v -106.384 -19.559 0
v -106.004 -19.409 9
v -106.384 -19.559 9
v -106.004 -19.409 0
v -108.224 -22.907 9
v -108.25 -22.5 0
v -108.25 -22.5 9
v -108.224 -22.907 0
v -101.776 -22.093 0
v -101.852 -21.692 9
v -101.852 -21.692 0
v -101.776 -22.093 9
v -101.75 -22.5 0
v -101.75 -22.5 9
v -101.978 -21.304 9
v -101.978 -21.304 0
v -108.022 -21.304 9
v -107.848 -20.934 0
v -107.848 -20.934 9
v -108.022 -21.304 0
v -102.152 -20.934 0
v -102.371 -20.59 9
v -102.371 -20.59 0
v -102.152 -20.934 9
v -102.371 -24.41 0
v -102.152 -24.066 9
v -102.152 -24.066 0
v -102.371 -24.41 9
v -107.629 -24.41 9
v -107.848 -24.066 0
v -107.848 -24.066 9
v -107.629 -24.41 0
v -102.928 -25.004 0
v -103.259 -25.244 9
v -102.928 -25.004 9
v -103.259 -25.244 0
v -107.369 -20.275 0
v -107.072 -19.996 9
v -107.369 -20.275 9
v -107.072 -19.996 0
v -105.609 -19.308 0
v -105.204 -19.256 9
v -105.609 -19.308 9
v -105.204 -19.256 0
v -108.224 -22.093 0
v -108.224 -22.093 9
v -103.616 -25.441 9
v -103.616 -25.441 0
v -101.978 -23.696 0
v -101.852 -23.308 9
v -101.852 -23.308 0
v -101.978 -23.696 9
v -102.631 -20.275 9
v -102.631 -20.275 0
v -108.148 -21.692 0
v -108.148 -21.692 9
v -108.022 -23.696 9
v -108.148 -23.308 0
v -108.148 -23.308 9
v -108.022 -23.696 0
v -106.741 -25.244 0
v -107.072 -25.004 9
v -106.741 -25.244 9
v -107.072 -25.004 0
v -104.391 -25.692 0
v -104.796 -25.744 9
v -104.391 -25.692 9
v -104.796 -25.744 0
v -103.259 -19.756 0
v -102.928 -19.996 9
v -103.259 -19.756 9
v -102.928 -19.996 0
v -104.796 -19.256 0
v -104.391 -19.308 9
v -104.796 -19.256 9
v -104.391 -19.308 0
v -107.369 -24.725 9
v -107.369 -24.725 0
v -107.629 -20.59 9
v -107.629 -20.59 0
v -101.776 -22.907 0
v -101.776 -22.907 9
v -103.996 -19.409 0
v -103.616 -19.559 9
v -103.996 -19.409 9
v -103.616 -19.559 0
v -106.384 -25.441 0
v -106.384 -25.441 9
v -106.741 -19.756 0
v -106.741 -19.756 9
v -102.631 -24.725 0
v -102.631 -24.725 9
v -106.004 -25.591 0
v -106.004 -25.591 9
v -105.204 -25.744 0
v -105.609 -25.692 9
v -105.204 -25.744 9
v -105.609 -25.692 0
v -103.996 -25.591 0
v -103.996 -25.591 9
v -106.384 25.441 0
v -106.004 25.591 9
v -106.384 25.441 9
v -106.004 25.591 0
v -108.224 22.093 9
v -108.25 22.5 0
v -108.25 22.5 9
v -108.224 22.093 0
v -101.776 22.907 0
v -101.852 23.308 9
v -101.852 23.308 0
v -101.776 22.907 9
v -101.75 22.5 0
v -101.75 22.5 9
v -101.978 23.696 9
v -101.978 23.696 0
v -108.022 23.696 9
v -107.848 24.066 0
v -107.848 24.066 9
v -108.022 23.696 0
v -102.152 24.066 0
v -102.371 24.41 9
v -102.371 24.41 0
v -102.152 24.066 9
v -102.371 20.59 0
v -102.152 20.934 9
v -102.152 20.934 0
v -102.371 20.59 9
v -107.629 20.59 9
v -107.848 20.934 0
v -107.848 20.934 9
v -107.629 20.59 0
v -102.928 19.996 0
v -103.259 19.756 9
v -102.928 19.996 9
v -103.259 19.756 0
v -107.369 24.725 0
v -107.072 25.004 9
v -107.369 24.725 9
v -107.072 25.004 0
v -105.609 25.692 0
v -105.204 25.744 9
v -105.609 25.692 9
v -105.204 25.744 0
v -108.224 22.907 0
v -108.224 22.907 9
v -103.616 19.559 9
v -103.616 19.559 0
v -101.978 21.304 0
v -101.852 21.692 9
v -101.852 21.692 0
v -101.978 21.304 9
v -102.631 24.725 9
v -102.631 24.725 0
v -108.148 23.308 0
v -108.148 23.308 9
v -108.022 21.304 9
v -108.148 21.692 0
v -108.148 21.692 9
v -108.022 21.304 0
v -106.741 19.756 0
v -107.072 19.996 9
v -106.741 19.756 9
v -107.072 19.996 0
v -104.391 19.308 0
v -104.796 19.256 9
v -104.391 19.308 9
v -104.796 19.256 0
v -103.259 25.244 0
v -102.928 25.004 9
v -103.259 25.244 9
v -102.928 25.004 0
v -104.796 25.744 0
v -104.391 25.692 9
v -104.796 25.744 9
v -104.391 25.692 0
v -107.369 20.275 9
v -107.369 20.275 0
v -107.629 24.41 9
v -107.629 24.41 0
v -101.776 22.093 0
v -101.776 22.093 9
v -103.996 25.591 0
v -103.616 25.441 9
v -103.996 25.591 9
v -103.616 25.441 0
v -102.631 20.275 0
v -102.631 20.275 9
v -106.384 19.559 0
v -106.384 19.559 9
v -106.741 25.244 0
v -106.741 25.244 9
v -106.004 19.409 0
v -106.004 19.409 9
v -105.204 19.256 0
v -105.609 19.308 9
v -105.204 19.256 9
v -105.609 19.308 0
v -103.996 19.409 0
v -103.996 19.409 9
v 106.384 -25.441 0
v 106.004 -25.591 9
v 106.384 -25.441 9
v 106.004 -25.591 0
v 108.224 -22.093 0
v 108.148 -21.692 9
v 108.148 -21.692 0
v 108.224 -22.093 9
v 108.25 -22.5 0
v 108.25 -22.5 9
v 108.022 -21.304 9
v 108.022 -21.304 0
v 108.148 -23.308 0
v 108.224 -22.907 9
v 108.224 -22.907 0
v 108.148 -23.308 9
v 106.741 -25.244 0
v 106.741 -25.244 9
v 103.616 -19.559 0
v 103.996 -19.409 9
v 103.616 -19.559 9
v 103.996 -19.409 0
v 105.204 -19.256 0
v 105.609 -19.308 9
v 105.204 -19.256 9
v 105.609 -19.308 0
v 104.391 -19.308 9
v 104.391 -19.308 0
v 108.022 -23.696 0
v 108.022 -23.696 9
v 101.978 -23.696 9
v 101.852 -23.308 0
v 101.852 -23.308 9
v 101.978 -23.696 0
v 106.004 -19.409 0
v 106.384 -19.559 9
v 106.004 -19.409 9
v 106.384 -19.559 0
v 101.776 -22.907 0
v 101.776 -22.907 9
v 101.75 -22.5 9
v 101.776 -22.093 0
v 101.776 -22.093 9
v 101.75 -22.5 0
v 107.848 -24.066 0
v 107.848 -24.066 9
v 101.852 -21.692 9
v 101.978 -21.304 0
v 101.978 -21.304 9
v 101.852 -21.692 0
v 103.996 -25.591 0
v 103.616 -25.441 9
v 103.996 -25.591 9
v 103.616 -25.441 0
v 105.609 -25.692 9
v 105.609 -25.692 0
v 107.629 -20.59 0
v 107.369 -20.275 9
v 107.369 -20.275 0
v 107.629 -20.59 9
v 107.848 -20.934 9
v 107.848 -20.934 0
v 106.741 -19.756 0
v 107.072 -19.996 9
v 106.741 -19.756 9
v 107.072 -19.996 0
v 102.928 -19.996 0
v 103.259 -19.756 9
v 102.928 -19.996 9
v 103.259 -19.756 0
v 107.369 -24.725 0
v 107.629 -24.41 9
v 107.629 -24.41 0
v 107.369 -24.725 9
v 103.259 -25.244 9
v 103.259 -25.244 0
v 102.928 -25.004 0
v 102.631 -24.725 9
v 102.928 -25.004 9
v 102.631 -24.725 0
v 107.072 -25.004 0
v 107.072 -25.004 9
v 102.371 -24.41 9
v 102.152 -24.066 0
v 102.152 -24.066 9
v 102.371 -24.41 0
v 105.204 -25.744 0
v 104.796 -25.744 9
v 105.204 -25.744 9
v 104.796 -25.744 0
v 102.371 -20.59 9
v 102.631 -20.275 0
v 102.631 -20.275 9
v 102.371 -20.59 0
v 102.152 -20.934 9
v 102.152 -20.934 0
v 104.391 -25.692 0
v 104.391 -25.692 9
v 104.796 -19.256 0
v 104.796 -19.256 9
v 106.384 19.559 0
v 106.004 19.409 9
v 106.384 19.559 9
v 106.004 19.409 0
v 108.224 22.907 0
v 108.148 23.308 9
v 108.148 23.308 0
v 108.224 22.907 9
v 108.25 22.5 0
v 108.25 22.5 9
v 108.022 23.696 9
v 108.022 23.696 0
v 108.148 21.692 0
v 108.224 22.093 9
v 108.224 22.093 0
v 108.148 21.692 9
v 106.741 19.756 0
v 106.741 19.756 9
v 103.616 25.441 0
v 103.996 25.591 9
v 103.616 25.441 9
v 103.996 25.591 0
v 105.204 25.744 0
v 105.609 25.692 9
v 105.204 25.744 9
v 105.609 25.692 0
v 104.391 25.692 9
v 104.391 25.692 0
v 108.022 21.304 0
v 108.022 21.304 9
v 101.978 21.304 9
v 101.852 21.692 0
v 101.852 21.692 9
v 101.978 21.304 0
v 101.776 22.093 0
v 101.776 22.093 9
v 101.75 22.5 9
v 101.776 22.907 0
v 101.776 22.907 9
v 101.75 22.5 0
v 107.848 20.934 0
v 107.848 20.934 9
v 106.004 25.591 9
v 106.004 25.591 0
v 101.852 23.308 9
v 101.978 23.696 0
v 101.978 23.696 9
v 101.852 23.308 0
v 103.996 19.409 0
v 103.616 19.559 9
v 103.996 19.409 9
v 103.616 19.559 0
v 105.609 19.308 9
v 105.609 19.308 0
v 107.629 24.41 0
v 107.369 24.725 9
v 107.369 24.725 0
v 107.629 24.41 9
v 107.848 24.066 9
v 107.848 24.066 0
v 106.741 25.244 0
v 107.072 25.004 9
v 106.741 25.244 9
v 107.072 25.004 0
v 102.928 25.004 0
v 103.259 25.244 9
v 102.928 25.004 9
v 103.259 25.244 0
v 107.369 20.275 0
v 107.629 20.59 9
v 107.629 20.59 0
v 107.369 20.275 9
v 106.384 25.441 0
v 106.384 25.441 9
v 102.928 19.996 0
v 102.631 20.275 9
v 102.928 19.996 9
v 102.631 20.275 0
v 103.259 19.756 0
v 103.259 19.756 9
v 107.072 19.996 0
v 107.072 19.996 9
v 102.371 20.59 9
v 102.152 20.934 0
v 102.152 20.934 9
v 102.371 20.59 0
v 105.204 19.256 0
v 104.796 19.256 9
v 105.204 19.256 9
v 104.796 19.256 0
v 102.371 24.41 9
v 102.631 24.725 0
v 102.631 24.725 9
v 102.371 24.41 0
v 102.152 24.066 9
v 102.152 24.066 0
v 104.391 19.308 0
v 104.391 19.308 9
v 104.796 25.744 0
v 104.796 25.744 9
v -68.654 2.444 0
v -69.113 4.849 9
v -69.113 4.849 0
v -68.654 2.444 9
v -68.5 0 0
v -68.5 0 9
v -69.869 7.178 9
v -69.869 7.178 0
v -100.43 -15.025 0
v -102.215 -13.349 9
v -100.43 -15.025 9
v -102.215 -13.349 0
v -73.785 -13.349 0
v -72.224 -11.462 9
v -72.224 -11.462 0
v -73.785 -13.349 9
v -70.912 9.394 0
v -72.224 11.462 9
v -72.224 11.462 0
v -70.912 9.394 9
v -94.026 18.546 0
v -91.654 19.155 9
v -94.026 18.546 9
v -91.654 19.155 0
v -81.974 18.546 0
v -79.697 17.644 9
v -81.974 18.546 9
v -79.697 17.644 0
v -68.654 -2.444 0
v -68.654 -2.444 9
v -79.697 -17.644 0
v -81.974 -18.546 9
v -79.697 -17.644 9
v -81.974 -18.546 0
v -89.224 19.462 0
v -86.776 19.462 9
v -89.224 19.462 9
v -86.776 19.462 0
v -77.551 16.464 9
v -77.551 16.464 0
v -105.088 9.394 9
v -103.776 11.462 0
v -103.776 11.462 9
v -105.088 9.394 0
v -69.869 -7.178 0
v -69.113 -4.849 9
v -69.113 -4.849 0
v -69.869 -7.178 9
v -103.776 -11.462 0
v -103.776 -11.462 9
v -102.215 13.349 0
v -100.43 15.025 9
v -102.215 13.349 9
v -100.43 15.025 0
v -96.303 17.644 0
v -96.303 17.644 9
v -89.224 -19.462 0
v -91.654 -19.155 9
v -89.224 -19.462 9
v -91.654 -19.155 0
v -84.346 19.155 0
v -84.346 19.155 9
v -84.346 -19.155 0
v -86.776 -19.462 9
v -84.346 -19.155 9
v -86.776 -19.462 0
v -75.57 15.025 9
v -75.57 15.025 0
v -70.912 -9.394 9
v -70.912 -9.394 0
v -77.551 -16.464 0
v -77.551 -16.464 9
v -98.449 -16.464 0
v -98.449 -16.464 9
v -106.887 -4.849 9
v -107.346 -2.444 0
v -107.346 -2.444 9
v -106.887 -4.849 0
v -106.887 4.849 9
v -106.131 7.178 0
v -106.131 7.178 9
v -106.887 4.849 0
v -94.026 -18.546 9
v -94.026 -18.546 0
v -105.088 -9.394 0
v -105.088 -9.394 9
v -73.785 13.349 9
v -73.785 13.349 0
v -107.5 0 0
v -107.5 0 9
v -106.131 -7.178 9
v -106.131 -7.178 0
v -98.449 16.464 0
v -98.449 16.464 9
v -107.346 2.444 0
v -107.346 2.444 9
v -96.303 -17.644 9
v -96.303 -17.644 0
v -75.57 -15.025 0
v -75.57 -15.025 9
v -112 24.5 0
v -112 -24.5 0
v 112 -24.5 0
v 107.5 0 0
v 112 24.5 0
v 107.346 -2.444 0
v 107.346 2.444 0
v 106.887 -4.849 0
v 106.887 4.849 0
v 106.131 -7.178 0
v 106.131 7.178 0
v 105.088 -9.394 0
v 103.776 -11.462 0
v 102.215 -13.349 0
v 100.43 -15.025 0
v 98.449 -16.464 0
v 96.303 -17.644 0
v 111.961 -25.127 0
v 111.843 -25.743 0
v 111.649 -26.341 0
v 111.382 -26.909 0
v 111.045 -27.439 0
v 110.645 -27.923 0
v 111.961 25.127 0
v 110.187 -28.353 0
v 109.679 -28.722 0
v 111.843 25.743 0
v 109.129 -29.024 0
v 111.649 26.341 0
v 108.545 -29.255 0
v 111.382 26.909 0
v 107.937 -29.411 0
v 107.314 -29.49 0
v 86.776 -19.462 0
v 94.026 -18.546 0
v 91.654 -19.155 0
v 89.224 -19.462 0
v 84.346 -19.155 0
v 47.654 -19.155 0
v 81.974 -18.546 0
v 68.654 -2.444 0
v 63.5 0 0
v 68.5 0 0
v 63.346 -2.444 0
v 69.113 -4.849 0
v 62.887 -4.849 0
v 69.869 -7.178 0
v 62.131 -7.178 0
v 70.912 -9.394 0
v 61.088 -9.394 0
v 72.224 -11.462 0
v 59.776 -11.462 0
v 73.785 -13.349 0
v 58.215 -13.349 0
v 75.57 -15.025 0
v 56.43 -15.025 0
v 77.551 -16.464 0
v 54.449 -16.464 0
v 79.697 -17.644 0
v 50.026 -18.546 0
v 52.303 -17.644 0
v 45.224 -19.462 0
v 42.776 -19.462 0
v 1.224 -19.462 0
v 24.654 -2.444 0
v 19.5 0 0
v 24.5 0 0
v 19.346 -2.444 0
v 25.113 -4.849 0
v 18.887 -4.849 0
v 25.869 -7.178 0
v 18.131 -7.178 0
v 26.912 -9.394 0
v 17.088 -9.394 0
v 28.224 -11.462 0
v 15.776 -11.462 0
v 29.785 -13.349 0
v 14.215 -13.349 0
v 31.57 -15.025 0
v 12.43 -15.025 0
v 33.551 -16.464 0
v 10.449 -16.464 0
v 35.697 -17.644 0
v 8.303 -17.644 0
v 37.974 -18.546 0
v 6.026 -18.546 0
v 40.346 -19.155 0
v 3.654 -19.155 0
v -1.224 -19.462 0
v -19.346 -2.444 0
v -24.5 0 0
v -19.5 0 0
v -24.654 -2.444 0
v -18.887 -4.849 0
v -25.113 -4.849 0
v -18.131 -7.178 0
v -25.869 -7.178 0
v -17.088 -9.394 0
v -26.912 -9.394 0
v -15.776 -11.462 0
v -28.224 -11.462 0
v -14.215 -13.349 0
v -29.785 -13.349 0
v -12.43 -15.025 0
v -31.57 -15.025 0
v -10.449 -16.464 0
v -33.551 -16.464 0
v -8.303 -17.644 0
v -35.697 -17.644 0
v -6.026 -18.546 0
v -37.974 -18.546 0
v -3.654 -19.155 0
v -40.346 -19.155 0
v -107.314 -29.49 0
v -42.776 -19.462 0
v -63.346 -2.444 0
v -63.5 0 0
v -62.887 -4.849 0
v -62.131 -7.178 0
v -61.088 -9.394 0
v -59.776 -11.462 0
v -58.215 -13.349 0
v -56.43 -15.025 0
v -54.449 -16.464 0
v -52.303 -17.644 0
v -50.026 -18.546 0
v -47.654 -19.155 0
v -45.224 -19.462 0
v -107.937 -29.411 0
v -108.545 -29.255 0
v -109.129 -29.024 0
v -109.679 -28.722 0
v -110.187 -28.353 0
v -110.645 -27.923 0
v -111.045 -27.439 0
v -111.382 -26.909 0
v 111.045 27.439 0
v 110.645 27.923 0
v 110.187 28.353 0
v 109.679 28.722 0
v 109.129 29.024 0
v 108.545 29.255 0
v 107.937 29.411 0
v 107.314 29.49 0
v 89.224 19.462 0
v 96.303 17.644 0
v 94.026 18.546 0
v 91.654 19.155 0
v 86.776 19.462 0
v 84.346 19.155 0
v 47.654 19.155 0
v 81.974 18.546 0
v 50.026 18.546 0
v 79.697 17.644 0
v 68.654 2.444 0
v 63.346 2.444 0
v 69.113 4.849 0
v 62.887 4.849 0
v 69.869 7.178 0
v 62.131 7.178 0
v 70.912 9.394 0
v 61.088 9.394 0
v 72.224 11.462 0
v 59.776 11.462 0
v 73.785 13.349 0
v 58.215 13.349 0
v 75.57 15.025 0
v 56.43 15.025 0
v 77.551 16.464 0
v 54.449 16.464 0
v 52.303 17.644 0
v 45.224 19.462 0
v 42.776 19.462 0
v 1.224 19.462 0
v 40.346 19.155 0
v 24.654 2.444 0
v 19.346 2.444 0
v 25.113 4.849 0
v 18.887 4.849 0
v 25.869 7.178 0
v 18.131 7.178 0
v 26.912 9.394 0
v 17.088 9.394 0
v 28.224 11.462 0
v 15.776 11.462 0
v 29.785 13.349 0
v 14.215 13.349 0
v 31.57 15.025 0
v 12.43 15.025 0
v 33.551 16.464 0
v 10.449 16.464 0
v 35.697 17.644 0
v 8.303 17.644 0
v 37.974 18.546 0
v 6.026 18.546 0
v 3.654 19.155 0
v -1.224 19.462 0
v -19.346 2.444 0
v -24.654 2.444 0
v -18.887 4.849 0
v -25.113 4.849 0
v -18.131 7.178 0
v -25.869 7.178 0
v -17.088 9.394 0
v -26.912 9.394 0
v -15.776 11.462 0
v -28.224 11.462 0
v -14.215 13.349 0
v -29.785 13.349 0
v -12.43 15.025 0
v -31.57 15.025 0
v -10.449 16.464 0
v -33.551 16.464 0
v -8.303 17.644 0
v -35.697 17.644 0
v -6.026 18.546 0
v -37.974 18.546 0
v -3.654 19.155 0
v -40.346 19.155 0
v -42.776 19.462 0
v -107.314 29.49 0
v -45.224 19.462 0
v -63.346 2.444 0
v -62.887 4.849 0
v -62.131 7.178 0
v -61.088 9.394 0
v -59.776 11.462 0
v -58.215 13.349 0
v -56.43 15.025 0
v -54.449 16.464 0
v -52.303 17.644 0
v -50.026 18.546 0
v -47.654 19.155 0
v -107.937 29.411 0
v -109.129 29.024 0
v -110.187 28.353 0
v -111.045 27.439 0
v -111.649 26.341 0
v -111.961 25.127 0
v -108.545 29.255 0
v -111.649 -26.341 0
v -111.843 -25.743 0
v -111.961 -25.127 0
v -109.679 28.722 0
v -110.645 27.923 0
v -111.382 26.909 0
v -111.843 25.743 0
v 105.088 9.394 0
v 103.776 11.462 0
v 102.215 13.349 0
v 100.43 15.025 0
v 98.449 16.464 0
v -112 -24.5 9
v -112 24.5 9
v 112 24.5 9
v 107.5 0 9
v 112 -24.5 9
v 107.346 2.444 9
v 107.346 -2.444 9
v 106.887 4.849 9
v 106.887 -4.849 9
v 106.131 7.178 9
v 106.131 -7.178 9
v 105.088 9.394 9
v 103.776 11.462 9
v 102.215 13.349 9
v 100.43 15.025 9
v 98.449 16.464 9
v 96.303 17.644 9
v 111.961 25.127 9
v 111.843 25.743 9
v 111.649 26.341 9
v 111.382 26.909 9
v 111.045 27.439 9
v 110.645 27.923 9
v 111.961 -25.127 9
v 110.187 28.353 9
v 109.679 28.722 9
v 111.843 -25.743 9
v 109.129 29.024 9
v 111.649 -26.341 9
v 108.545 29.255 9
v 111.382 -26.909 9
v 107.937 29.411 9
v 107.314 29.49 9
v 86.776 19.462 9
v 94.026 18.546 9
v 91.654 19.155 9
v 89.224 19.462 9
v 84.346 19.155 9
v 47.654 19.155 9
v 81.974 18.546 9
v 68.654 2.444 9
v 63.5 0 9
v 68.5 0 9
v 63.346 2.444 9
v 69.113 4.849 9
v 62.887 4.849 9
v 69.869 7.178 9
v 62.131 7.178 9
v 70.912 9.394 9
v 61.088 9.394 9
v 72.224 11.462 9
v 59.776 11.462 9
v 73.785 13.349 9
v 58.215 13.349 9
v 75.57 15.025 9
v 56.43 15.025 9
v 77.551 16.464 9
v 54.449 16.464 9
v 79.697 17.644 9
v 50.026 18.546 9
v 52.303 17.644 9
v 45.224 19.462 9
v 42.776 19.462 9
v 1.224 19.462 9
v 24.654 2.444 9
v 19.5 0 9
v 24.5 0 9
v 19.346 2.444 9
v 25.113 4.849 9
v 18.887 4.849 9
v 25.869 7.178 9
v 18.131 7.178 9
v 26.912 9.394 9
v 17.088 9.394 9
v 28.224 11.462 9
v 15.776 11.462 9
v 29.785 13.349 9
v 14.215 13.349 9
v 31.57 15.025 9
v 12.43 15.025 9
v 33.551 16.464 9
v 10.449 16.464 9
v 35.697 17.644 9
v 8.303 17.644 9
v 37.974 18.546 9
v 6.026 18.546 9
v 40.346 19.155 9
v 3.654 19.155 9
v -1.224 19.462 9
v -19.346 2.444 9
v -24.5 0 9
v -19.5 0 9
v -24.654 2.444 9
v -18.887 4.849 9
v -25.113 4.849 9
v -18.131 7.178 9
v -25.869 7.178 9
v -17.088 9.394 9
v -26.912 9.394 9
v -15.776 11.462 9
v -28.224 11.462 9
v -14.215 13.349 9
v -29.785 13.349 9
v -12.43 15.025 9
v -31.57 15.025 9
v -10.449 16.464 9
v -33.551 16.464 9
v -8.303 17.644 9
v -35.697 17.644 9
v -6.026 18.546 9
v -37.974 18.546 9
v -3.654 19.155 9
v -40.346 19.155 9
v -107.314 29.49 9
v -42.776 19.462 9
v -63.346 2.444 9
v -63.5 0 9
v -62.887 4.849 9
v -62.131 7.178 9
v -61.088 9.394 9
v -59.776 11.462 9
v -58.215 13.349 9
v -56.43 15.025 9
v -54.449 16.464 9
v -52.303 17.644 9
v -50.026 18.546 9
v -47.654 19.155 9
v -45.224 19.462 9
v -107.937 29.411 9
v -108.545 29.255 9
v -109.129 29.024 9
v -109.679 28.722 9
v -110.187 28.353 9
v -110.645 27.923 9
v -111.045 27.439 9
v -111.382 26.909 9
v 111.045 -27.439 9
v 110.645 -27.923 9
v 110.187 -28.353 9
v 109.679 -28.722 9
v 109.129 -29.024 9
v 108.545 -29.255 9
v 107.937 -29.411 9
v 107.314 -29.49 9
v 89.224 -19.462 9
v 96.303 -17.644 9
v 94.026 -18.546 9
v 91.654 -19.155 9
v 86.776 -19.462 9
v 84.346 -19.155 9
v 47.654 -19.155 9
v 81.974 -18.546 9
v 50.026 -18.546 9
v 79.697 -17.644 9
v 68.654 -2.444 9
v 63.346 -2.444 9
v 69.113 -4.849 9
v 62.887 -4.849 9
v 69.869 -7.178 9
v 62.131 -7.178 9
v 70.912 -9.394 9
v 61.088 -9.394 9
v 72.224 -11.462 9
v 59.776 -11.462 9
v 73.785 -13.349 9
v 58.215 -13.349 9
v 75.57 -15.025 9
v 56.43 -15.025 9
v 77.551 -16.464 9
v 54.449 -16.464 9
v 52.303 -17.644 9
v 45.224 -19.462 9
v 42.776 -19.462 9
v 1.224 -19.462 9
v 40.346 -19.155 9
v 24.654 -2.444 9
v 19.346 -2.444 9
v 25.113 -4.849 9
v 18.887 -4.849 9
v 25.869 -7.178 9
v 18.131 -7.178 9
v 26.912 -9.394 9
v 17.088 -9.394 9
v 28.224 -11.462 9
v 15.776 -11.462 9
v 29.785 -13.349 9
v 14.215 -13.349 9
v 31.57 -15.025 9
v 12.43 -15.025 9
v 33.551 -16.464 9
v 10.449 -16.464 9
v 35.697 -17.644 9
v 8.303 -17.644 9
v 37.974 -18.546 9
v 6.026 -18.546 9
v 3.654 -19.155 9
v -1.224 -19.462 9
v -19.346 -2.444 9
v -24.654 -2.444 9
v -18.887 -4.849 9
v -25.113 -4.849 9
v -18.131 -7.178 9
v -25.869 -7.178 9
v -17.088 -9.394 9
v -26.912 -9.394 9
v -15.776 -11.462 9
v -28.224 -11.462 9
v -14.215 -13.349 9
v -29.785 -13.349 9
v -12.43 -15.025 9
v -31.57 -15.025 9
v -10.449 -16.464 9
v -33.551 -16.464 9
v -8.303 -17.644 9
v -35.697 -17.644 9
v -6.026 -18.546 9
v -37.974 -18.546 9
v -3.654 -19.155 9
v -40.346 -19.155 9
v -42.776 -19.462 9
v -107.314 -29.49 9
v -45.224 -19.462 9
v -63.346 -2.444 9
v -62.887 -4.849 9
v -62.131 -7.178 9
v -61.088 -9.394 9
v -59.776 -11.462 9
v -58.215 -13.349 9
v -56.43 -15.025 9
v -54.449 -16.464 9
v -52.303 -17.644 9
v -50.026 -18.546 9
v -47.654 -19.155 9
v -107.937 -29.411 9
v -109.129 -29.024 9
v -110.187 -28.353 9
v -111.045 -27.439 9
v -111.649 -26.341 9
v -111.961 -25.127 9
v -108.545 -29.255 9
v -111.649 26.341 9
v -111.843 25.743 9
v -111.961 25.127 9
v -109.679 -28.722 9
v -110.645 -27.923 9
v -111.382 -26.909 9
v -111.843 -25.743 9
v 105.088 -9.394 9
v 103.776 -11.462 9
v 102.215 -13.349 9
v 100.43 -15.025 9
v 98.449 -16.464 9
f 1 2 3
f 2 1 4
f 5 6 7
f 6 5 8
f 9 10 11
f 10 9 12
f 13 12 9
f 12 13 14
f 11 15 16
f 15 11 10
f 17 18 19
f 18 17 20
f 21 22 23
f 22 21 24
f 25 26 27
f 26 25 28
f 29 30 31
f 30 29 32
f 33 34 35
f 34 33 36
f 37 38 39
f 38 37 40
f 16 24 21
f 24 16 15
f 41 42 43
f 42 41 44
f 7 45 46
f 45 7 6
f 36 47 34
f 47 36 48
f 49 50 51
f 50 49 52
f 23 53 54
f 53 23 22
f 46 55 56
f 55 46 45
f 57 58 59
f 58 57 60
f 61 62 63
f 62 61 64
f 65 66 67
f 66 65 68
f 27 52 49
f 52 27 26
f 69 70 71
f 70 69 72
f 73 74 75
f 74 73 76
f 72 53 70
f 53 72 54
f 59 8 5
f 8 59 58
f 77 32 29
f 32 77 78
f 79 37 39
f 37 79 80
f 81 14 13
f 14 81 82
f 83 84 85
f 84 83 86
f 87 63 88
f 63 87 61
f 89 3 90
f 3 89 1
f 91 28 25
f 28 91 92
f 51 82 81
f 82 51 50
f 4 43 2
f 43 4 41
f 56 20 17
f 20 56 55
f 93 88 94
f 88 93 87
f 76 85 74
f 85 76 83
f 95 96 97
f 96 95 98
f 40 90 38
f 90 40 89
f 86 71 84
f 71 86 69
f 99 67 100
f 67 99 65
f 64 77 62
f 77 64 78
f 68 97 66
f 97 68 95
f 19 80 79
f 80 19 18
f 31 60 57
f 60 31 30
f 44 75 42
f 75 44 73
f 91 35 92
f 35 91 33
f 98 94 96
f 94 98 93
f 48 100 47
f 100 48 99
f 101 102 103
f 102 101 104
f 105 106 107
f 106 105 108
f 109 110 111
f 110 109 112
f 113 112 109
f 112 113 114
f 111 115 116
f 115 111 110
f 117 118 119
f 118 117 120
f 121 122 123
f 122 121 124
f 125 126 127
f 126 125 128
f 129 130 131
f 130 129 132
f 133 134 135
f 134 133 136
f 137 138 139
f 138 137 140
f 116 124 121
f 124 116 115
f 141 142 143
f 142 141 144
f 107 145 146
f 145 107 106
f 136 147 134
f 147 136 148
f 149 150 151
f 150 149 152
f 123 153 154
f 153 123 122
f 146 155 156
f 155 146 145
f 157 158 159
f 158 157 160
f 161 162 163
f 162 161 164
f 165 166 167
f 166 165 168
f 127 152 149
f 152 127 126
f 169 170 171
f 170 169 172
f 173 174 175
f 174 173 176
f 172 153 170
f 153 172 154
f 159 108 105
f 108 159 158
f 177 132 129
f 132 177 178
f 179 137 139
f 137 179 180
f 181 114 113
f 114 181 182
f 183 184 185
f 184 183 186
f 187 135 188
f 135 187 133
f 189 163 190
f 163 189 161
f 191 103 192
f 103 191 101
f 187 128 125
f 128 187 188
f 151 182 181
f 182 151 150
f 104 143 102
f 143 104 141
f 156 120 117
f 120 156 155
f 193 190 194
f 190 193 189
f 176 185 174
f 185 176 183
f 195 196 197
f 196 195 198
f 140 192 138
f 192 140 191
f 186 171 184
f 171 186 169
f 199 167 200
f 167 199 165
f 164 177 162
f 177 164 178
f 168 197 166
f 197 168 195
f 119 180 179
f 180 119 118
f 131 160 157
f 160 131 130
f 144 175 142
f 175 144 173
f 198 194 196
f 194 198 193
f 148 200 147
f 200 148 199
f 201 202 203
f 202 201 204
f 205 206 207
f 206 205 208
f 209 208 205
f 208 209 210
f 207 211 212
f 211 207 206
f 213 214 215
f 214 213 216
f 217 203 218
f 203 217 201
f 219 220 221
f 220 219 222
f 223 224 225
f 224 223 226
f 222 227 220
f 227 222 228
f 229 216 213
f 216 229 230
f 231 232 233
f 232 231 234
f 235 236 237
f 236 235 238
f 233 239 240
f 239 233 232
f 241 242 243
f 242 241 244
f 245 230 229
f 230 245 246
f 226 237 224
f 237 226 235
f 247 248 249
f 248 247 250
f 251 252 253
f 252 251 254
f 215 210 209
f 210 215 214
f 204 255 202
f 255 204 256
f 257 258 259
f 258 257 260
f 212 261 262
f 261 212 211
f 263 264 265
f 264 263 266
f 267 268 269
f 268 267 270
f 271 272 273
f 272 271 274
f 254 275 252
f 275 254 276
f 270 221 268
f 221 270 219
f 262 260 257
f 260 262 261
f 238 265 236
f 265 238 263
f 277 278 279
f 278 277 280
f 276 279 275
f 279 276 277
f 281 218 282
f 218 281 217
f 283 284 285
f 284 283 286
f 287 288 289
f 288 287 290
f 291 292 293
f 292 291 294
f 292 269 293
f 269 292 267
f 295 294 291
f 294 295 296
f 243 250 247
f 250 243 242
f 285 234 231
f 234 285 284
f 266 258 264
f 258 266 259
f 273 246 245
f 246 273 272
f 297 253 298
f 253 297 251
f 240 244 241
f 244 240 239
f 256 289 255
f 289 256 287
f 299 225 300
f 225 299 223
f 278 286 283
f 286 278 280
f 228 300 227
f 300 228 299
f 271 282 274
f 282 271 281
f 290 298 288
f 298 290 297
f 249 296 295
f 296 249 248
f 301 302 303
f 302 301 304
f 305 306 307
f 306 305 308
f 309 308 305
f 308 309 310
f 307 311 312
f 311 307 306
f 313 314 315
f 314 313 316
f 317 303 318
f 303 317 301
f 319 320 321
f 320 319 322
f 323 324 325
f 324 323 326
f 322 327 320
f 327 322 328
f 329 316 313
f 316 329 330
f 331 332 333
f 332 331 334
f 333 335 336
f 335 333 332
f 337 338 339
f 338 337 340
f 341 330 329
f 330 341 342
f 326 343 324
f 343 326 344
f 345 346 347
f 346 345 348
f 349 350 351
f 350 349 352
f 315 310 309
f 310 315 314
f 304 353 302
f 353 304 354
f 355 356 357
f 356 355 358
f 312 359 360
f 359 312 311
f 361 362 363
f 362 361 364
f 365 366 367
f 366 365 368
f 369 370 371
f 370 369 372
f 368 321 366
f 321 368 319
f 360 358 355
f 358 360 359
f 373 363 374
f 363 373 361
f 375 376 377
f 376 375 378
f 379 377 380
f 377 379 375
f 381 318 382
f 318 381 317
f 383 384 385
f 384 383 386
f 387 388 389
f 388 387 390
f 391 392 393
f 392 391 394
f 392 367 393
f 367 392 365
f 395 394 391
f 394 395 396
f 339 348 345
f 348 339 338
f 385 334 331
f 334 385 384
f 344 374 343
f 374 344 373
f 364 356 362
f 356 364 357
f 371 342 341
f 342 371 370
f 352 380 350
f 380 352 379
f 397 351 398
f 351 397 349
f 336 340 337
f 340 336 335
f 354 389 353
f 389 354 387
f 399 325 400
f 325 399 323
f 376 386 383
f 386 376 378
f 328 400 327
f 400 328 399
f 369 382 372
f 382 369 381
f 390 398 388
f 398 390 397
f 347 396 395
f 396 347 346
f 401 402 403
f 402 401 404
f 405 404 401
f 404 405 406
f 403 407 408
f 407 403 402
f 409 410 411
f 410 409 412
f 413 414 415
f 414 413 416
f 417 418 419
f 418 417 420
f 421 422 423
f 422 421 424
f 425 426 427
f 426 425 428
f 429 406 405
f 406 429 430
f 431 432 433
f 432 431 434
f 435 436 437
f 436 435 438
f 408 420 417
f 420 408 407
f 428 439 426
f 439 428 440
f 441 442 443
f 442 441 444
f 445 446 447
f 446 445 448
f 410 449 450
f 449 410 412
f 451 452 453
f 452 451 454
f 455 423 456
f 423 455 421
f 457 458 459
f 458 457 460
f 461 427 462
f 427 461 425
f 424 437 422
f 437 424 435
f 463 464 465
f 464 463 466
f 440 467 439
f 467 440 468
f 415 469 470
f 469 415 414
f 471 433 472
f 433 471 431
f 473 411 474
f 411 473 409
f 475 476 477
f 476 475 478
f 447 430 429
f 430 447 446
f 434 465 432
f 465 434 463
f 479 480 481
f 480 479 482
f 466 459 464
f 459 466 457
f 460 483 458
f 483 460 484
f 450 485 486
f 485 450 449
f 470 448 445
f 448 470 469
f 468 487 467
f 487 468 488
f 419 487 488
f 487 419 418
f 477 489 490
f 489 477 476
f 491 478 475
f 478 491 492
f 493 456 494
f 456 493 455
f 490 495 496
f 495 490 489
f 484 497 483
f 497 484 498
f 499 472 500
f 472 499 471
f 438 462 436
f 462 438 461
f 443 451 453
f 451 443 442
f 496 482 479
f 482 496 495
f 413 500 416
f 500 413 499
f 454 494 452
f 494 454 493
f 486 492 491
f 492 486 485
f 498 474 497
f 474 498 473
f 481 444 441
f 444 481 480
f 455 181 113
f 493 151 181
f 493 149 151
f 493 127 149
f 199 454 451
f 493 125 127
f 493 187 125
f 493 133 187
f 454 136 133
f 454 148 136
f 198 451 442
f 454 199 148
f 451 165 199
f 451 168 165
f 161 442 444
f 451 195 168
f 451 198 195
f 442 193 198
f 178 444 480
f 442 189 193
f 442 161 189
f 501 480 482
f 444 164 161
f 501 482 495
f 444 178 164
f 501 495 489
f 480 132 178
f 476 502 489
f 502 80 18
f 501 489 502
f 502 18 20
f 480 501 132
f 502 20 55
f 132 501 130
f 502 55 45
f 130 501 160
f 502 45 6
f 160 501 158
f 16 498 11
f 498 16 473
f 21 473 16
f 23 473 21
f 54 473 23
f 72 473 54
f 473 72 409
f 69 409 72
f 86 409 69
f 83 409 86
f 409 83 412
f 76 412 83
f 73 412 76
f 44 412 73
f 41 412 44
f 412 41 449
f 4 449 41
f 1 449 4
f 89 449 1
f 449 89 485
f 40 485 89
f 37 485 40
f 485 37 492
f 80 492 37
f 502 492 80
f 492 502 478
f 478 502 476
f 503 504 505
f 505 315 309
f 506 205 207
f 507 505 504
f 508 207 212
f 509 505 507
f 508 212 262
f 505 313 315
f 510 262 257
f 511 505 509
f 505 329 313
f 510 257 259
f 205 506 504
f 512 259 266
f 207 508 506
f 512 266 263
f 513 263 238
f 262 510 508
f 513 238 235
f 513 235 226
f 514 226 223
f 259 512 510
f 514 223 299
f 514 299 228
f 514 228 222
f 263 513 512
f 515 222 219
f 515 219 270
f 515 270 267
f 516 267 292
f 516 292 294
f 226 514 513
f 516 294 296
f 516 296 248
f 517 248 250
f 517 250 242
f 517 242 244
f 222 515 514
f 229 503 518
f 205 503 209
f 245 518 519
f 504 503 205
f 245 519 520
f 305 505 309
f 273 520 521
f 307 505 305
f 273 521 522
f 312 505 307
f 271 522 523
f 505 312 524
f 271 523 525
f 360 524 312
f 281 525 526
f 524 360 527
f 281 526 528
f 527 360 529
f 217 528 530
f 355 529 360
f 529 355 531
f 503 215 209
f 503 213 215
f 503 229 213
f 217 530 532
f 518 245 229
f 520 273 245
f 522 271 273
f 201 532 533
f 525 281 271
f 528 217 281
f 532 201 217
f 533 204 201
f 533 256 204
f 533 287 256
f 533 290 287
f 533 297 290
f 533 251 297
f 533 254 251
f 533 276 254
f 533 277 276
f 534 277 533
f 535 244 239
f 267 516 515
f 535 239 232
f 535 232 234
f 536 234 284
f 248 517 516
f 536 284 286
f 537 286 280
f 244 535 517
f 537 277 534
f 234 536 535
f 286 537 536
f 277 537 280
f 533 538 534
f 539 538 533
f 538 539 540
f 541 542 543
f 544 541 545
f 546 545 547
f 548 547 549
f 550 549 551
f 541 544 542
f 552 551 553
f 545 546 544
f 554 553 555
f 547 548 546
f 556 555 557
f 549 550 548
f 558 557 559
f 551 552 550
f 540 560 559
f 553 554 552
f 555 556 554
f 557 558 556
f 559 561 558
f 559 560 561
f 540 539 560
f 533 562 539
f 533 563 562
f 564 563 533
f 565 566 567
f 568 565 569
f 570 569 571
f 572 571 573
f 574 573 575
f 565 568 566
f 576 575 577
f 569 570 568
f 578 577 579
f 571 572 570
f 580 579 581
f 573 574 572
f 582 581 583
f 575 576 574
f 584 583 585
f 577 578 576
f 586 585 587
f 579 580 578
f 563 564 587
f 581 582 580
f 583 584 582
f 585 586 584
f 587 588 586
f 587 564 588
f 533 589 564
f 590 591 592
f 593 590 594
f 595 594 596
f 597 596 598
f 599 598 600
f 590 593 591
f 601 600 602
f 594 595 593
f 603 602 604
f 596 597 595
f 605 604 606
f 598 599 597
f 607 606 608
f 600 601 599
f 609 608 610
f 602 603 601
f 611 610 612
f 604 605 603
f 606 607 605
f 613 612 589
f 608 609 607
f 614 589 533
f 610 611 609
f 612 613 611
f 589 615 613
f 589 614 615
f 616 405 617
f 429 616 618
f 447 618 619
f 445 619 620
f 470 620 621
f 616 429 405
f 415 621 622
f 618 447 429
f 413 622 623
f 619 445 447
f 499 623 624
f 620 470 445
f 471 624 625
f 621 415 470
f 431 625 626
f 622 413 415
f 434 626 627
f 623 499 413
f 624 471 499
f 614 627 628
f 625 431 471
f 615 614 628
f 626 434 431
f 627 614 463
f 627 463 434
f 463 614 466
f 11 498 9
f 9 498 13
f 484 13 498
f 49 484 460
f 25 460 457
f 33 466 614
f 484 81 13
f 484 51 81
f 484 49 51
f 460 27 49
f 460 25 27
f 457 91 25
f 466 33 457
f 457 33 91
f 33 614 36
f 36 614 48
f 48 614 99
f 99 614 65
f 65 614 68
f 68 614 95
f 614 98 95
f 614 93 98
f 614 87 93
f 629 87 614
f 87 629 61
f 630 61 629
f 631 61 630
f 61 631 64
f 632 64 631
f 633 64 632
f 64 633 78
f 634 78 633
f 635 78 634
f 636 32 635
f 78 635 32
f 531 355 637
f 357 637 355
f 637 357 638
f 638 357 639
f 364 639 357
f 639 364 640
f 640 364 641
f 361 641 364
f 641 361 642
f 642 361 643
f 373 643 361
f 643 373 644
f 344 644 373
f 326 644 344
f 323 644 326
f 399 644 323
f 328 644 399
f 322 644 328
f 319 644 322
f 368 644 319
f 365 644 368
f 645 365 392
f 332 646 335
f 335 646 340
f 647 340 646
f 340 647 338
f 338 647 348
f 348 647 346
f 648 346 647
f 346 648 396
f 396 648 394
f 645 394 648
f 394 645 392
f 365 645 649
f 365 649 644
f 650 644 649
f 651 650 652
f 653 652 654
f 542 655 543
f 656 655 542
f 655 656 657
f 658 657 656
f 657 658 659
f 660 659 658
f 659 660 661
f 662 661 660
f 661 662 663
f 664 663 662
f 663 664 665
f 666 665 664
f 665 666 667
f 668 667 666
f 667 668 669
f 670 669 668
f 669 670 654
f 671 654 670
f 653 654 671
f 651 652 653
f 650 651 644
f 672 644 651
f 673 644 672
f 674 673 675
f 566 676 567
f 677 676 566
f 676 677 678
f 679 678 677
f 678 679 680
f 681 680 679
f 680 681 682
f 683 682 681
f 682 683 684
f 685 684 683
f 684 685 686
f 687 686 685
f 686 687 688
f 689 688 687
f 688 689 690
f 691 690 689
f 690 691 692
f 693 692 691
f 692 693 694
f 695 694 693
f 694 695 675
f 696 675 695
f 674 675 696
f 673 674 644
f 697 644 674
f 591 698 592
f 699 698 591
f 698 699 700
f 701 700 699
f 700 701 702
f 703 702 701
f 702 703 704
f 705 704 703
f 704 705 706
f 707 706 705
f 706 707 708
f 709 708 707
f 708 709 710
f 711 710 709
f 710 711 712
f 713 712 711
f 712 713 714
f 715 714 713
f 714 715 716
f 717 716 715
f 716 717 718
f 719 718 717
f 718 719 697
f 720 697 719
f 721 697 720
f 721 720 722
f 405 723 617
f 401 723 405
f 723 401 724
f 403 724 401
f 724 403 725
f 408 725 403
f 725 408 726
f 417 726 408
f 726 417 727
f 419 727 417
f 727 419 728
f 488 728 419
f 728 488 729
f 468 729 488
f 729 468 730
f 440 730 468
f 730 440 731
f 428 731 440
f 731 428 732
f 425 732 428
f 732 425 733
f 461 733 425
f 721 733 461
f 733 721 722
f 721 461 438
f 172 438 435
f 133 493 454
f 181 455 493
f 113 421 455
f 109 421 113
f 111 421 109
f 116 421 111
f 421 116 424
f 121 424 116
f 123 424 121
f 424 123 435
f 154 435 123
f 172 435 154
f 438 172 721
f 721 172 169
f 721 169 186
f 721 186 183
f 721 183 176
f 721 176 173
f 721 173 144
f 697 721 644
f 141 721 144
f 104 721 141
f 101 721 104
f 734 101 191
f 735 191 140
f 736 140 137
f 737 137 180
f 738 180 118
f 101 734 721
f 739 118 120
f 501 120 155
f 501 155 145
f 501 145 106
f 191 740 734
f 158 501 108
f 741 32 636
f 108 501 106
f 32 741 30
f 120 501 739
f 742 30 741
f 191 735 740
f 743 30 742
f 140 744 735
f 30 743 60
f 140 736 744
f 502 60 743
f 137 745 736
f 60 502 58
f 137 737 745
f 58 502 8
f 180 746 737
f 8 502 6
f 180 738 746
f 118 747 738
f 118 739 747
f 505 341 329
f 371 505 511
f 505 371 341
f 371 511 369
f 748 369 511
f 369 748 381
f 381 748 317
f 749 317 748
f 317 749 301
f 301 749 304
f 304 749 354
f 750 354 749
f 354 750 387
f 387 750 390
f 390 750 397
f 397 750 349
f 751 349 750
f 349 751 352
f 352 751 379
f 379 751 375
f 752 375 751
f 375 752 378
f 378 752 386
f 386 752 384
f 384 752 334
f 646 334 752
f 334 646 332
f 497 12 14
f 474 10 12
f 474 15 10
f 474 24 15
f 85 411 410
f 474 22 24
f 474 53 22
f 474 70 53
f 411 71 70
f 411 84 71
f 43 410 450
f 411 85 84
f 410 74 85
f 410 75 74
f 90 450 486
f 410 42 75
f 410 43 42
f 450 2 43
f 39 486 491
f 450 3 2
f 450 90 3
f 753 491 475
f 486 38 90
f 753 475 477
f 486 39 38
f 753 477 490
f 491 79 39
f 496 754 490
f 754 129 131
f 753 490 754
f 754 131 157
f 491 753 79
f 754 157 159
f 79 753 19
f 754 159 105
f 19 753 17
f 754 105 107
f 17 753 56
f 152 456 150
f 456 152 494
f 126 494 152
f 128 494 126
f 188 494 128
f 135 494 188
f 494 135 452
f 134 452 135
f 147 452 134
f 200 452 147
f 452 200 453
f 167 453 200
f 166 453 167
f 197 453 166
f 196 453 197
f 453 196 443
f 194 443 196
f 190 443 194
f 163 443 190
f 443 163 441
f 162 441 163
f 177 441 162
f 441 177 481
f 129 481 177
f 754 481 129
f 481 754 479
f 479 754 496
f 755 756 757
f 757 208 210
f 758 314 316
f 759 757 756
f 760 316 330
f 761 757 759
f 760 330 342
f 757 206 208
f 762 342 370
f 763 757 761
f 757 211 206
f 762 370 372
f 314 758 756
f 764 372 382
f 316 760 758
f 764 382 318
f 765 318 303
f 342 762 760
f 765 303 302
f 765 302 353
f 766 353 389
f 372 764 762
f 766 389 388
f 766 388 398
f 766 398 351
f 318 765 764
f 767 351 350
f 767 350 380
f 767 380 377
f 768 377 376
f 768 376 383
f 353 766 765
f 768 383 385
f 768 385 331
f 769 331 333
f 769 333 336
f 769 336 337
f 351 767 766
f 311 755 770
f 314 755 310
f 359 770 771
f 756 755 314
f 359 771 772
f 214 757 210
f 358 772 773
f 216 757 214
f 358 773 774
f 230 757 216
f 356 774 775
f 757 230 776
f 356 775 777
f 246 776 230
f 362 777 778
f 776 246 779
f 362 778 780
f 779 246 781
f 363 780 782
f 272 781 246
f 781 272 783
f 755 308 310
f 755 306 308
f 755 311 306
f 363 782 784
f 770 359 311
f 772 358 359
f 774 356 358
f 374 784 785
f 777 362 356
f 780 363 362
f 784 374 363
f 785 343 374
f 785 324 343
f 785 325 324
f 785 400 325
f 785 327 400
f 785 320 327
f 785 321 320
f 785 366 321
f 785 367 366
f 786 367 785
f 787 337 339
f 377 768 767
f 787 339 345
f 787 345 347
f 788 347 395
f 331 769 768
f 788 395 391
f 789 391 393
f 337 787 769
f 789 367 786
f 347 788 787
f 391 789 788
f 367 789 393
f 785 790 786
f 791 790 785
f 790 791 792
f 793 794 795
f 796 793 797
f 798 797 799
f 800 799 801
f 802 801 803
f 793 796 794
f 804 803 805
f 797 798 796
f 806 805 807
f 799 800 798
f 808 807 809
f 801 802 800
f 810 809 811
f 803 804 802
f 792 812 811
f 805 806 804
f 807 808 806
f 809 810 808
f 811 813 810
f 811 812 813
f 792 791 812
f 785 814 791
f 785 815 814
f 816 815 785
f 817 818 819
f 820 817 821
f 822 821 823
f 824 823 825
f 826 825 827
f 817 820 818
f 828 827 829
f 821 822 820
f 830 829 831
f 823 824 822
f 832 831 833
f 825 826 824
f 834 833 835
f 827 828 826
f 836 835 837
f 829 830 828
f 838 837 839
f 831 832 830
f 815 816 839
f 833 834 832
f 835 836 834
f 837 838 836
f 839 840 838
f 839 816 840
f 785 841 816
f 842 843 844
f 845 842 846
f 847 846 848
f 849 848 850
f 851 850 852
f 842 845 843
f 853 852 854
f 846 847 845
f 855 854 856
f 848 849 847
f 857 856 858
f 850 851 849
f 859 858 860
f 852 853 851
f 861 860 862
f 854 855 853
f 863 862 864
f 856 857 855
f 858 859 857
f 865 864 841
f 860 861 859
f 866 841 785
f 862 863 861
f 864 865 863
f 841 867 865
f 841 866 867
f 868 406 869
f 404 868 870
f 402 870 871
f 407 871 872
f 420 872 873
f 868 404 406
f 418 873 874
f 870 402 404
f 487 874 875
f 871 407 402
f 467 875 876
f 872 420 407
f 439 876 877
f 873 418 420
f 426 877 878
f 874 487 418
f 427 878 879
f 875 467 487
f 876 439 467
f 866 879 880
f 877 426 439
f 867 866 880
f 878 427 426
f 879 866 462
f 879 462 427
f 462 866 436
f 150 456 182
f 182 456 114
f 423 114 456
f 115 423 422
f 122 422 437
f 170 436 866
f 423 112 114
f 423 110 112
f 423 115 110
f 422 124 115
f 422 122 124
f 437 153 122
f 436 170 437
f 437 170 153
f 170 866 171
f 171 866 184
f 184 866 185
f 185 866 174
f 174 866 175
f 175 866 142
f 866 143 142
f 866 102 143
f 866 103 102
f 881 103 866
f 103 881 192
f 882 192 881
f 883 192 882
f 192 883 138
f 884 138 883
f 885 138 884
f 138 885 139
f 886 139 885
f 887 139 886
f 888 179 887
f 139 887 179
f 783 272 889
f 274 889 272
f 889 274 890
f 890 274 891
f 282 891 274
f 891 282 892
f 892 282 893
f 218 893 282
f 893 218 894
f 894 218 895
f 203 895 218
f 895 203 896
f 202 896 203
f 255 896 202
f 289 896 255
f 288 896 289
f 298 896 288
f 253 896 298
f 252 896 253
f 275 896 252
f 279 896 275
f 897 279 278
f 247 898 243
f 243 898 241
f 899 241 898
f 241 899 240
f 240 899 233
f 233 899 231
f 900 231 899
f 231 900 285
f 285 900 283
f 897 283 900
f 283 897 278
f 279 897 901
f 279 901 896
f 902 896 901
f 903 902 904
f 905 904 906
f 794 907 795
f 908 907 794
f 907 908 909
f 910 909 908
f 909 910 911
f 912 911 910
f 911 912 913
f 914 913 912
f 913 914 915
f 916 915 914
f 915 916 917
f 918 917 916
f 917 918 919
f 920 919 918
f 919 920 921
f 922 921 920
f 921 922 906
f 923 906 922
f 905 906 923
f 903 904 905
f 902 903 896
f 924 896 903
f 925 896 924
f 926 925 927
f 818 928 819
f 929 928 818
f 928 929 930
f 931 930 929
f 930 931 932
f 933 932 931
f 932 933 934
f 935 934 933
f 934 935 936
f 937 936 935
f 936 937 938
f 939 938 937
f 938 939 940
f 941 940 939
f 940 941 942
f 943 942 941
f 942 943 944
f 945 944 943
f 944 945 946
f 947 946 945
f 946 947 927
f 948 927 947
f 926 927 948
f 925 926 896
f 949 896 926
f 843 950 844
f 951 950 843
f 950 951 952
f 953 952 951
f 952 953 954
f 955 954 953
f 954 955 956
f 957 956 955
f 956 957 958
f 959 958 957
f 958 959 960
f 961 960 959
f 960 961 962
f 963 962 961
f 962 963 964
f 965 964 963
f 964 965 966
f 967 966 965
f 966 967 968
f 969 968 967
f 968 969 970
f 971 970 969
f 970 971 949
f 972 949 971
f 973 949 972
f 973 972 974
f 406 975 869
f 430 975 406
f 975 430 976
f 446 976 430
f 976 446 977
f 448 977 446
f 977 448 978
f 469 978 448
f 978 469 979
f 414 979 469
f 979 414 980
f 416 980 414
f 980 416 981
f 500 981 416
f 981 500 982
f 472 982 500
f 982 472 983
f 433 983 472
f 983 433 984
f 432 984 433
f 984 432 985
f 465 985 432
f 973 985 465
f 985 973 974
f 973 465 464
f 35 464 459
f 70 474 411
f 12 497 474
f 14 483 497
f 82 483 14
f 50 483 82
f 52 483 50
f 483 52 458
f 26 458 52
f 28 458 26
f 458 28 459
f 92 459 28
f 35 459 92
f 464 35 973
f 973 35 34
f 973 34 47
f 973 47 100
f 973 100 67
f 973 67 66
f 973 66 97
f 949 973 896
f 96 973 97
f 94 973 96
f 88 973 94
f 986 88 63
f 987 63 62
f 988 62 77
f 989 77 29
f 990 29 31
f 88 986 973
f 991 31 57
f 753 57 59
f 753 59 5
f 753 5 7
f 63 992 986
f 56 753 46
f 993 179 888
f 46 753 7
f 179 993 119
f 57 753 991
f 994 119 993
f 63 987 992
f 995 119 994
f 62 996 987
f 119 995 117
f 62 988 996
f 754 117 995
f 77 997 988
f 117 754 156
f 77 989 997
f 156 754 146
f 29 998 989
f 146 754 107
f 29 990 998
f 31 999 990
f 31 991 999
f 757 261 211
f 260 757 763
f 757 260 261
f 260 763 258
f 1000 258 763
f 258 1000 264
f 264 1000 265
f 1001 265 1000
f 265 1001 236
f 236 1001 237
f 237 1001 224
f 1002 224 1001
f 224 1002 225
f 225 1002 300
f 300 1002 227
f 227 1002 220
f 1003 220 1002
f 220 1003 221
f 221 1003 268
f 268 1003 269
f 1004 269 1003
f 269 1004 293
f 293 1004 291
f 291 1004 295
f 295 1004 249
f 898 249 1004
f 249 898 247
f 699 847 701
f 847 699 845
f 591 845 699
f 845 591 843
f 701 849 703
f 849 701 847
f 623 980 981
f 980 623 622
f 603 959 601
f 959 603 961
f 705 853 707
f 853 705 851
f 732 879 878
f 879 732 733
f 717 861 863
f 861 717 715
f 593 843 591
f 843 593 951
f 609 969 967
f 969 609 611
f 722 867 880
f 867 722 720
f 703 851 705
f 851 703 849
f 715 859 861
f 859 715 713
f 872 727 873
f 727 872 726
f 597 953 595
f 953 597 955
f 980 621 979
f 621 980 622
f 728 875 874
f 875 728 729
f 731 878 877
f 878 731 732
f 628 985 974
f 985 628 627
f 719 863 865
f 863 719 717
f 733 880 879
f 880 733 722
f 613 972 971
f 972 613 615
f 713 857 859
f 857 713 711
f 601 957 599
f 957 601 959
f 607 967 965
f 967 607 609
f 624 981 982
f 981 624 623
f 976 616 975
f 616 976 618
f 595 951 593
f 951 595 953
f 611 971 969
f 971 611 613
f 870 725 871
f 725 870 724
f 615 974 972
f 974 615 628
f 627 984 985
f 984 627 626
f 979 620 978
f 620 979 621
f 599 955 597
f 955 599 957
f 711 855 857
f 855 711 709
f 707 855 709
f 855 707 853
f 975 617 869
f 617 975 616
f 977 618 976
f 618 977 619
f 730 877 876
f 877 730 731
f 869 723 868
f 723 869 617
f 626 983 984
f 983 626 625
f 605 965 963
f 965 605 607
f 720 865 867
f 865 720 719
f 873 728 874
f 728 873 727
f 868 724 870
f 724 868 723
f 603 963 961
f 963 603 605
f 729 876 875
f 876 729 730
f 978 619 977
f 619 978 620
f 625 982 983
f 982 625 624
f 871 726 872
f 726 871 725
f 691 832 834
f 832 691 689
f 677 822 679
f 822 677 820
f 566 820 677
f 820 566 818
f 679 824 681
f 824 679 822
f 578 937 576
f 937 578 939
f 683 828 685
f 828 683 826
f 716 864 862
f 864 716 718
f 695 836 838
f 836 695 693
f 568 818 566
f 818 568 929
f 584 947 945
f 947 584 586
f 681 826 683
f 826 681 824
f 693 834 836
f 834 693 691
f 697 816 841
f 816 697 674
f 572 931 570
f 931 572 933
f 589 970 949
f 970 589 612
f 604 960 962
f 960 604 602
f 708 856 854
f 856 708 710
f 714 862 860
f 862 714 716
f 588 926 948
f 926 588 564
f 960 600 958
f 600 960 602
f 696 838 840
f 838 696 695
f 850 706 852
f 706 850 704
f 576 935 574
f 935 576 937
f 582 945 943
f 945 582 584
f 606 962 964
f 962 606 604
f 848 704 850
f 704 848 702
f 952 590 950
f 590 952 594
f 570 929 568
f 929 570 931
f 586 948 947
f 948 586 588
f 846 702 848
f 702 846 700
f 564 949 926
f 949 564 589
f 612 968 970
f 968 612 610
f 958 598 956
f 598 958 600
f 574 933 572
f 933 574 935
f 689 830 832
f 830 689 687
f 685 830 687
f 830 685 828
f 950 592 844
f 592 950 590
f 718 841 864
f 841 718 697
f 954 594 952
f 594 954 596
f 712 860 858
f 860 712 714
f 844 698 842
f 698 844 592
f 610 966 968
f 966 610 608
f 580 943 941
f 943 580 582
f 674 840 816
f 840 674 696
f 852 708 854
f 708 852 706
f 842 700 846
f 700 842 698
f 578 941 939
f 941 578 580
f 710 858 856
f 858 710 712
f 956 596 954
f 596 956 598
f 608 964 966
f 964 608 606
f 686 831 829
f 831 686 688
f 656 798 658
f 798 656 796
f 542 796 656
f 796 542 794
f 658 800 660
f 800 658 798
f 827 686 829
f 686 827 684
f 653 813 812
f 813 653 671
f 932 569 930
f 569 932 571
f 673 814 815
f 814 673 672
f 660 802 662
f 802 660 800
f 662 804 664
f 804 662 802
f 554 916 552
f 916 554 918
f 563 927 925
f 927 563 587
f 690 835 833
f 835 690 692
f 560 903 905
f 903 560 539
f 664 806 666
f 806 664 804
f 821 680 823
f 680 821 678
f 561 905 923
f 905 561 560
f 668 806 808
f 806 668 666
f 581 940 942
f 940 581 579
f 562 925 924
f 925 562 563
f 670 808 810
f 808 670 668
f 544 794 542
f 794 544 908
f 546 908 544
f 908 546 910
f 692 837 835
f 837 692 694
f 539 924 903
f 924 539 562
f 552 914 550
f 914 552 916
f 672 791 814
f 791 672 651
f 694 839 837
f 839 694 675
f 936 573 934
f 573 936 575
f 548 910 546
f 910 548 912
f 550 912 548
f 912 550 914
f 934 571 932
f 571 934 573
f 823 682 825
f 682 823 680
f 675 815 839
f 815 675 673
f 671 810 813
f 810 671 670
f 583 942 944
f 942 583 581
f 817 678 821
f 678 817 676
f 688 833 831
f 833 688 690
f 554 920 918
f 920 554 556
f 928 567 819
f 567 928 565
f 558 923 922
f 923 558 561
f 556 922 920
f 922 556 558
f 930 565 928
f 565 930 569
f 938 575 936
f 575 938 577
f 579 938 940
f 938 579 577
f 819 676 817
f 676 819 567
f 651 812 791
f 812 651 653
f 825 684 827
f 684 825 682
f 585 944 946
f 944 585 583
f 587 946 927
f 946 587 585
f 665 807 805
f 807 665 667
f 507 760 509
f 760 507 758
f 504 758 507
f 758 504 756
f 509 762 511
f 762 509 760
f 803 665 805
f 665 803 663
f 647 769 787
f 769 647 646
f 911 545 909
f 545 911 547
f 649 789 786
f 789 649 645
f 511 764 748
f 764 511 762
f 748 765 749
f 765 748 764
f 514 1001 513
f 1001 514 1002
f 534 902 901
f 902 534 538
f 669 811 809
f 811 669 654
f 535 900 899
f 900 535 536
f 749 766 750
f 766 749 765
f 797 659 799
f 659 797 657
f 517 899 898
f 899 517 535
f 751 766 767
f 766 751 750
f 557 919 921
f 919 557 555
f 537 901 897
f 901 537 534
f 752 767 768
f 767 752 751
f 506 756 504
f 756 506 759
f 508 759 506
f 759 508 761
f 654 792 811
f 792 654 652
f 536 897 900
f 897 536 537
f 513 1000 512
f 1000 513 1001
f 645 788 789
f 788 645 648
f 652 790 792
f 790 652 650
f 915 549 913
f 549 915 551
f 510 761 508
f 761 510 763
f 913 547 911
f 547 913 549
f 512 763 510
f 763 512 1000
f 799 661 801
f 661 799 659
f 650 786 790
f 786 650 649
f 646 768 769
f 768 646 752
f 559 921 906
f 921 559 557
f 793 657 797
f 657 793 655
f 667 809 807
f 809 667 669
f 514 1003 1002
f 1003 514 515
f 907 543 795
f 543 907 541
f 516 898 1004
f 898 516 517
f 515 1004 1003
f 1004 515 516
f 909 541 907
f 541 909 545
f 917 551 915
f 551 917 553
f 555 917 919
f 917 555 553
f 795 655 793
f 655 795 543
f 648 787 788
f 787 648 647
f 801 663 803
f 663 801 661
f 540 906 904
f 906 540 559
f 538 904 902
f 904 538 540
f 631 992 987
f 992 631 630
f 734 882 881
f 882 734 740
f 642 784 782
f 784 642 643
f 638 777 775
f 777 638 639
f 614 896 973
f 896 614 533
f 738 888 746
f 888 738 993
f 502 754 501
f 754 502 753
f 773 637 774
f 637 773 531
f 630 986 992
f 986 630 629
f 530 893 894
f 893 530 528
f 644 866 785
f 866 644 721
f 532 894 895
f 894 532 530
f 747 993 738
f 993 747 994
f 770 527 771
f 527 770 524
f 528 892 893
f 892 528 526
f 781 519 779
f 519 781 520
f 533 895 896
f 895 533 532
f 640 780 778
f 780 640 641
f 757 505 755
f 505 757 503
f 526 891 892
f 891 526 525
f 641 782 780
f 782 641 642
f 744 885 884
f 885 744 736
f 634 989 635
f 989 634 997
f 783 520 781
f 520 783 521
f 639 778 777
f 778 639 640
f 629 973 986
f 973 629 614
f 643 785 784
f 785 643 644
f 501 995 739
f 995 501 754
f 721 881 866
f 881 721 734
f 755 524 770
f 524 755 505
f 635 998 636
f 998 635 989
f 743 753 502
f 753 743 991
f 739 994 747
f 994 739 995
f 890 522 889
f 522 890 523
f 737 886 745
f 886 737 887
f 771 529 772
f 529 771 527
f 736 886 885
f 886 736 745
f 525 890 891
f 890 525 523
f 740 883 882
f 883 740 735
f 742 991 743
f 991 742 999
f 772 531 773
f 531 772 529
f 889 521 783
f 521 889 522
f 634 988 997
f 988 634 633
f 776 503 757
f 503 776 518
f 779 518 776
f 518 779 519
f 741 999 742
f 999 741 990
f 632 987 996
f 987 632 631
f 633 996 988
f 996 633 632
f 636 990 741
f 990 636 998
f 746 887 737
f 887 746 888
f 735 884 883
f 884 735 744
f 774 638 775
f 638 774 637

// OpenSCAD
$fn = 50;


difference() {
	union() {
		hull() {
			translate(v = [-107.0000000000, 24.5000000000, 0]) {
				cylinder(h = 9, r = 5);
			}
			translate(v = [107.0000000000, 24.5000000000, 0]) {
				cylinder(h = 9, r = 5);
			}
			translate(v = [-107.0000000000, -24.5000000000, 0]) {
				cylinder(h = 9, r = 5);
			}
			translate(v = [107.0000000000, -24.5000000000, 0]) {
				cylinder(h = 9, r = 5);
			}
		}
	}
	union() {
		#translate(v = [-105.0000000000, -22.5000000000, -100.0000000000]) {
			cylinder(h = 200, r = 3.2500000000);
		}
		#translate(v = [-105.0000000000, 22.5000000000, -100.0000000000]) {
			cylinder(h = 200, r = 3.2500000000);
		}
		#translate(v = [105.0000000000, -22.5000000000, -100.0000000000]) {
			cylinder(h = 200, r = 3.2500000000);
		}
		#translate(v = [105.0000000000, 22.5000000000, -100.0000000000]) {
			cylinder(h = 200, r = 3.2500000000);
		}
		#translate(v = [-88.0000000000, 0, 0]) {
			cylinder(h = 9, r = 19.5000000000);
		}
		#translate(v = [-44.0000000000, 0, 0]) {
			cylinder(h = 9, r = 19.5000000000);
		}
		#cylinder(h = 9, r = 19.5000000000);
		#translate(v = [44.0000000000, 0, 0]) {
			cylinder(h = 9, r = 19.5000000000);
		}
		#translate(v = [88.0000000000, 0, 0]) {
			cylinder(h = 9, r = 19.5000000000);
		}
	}
}
